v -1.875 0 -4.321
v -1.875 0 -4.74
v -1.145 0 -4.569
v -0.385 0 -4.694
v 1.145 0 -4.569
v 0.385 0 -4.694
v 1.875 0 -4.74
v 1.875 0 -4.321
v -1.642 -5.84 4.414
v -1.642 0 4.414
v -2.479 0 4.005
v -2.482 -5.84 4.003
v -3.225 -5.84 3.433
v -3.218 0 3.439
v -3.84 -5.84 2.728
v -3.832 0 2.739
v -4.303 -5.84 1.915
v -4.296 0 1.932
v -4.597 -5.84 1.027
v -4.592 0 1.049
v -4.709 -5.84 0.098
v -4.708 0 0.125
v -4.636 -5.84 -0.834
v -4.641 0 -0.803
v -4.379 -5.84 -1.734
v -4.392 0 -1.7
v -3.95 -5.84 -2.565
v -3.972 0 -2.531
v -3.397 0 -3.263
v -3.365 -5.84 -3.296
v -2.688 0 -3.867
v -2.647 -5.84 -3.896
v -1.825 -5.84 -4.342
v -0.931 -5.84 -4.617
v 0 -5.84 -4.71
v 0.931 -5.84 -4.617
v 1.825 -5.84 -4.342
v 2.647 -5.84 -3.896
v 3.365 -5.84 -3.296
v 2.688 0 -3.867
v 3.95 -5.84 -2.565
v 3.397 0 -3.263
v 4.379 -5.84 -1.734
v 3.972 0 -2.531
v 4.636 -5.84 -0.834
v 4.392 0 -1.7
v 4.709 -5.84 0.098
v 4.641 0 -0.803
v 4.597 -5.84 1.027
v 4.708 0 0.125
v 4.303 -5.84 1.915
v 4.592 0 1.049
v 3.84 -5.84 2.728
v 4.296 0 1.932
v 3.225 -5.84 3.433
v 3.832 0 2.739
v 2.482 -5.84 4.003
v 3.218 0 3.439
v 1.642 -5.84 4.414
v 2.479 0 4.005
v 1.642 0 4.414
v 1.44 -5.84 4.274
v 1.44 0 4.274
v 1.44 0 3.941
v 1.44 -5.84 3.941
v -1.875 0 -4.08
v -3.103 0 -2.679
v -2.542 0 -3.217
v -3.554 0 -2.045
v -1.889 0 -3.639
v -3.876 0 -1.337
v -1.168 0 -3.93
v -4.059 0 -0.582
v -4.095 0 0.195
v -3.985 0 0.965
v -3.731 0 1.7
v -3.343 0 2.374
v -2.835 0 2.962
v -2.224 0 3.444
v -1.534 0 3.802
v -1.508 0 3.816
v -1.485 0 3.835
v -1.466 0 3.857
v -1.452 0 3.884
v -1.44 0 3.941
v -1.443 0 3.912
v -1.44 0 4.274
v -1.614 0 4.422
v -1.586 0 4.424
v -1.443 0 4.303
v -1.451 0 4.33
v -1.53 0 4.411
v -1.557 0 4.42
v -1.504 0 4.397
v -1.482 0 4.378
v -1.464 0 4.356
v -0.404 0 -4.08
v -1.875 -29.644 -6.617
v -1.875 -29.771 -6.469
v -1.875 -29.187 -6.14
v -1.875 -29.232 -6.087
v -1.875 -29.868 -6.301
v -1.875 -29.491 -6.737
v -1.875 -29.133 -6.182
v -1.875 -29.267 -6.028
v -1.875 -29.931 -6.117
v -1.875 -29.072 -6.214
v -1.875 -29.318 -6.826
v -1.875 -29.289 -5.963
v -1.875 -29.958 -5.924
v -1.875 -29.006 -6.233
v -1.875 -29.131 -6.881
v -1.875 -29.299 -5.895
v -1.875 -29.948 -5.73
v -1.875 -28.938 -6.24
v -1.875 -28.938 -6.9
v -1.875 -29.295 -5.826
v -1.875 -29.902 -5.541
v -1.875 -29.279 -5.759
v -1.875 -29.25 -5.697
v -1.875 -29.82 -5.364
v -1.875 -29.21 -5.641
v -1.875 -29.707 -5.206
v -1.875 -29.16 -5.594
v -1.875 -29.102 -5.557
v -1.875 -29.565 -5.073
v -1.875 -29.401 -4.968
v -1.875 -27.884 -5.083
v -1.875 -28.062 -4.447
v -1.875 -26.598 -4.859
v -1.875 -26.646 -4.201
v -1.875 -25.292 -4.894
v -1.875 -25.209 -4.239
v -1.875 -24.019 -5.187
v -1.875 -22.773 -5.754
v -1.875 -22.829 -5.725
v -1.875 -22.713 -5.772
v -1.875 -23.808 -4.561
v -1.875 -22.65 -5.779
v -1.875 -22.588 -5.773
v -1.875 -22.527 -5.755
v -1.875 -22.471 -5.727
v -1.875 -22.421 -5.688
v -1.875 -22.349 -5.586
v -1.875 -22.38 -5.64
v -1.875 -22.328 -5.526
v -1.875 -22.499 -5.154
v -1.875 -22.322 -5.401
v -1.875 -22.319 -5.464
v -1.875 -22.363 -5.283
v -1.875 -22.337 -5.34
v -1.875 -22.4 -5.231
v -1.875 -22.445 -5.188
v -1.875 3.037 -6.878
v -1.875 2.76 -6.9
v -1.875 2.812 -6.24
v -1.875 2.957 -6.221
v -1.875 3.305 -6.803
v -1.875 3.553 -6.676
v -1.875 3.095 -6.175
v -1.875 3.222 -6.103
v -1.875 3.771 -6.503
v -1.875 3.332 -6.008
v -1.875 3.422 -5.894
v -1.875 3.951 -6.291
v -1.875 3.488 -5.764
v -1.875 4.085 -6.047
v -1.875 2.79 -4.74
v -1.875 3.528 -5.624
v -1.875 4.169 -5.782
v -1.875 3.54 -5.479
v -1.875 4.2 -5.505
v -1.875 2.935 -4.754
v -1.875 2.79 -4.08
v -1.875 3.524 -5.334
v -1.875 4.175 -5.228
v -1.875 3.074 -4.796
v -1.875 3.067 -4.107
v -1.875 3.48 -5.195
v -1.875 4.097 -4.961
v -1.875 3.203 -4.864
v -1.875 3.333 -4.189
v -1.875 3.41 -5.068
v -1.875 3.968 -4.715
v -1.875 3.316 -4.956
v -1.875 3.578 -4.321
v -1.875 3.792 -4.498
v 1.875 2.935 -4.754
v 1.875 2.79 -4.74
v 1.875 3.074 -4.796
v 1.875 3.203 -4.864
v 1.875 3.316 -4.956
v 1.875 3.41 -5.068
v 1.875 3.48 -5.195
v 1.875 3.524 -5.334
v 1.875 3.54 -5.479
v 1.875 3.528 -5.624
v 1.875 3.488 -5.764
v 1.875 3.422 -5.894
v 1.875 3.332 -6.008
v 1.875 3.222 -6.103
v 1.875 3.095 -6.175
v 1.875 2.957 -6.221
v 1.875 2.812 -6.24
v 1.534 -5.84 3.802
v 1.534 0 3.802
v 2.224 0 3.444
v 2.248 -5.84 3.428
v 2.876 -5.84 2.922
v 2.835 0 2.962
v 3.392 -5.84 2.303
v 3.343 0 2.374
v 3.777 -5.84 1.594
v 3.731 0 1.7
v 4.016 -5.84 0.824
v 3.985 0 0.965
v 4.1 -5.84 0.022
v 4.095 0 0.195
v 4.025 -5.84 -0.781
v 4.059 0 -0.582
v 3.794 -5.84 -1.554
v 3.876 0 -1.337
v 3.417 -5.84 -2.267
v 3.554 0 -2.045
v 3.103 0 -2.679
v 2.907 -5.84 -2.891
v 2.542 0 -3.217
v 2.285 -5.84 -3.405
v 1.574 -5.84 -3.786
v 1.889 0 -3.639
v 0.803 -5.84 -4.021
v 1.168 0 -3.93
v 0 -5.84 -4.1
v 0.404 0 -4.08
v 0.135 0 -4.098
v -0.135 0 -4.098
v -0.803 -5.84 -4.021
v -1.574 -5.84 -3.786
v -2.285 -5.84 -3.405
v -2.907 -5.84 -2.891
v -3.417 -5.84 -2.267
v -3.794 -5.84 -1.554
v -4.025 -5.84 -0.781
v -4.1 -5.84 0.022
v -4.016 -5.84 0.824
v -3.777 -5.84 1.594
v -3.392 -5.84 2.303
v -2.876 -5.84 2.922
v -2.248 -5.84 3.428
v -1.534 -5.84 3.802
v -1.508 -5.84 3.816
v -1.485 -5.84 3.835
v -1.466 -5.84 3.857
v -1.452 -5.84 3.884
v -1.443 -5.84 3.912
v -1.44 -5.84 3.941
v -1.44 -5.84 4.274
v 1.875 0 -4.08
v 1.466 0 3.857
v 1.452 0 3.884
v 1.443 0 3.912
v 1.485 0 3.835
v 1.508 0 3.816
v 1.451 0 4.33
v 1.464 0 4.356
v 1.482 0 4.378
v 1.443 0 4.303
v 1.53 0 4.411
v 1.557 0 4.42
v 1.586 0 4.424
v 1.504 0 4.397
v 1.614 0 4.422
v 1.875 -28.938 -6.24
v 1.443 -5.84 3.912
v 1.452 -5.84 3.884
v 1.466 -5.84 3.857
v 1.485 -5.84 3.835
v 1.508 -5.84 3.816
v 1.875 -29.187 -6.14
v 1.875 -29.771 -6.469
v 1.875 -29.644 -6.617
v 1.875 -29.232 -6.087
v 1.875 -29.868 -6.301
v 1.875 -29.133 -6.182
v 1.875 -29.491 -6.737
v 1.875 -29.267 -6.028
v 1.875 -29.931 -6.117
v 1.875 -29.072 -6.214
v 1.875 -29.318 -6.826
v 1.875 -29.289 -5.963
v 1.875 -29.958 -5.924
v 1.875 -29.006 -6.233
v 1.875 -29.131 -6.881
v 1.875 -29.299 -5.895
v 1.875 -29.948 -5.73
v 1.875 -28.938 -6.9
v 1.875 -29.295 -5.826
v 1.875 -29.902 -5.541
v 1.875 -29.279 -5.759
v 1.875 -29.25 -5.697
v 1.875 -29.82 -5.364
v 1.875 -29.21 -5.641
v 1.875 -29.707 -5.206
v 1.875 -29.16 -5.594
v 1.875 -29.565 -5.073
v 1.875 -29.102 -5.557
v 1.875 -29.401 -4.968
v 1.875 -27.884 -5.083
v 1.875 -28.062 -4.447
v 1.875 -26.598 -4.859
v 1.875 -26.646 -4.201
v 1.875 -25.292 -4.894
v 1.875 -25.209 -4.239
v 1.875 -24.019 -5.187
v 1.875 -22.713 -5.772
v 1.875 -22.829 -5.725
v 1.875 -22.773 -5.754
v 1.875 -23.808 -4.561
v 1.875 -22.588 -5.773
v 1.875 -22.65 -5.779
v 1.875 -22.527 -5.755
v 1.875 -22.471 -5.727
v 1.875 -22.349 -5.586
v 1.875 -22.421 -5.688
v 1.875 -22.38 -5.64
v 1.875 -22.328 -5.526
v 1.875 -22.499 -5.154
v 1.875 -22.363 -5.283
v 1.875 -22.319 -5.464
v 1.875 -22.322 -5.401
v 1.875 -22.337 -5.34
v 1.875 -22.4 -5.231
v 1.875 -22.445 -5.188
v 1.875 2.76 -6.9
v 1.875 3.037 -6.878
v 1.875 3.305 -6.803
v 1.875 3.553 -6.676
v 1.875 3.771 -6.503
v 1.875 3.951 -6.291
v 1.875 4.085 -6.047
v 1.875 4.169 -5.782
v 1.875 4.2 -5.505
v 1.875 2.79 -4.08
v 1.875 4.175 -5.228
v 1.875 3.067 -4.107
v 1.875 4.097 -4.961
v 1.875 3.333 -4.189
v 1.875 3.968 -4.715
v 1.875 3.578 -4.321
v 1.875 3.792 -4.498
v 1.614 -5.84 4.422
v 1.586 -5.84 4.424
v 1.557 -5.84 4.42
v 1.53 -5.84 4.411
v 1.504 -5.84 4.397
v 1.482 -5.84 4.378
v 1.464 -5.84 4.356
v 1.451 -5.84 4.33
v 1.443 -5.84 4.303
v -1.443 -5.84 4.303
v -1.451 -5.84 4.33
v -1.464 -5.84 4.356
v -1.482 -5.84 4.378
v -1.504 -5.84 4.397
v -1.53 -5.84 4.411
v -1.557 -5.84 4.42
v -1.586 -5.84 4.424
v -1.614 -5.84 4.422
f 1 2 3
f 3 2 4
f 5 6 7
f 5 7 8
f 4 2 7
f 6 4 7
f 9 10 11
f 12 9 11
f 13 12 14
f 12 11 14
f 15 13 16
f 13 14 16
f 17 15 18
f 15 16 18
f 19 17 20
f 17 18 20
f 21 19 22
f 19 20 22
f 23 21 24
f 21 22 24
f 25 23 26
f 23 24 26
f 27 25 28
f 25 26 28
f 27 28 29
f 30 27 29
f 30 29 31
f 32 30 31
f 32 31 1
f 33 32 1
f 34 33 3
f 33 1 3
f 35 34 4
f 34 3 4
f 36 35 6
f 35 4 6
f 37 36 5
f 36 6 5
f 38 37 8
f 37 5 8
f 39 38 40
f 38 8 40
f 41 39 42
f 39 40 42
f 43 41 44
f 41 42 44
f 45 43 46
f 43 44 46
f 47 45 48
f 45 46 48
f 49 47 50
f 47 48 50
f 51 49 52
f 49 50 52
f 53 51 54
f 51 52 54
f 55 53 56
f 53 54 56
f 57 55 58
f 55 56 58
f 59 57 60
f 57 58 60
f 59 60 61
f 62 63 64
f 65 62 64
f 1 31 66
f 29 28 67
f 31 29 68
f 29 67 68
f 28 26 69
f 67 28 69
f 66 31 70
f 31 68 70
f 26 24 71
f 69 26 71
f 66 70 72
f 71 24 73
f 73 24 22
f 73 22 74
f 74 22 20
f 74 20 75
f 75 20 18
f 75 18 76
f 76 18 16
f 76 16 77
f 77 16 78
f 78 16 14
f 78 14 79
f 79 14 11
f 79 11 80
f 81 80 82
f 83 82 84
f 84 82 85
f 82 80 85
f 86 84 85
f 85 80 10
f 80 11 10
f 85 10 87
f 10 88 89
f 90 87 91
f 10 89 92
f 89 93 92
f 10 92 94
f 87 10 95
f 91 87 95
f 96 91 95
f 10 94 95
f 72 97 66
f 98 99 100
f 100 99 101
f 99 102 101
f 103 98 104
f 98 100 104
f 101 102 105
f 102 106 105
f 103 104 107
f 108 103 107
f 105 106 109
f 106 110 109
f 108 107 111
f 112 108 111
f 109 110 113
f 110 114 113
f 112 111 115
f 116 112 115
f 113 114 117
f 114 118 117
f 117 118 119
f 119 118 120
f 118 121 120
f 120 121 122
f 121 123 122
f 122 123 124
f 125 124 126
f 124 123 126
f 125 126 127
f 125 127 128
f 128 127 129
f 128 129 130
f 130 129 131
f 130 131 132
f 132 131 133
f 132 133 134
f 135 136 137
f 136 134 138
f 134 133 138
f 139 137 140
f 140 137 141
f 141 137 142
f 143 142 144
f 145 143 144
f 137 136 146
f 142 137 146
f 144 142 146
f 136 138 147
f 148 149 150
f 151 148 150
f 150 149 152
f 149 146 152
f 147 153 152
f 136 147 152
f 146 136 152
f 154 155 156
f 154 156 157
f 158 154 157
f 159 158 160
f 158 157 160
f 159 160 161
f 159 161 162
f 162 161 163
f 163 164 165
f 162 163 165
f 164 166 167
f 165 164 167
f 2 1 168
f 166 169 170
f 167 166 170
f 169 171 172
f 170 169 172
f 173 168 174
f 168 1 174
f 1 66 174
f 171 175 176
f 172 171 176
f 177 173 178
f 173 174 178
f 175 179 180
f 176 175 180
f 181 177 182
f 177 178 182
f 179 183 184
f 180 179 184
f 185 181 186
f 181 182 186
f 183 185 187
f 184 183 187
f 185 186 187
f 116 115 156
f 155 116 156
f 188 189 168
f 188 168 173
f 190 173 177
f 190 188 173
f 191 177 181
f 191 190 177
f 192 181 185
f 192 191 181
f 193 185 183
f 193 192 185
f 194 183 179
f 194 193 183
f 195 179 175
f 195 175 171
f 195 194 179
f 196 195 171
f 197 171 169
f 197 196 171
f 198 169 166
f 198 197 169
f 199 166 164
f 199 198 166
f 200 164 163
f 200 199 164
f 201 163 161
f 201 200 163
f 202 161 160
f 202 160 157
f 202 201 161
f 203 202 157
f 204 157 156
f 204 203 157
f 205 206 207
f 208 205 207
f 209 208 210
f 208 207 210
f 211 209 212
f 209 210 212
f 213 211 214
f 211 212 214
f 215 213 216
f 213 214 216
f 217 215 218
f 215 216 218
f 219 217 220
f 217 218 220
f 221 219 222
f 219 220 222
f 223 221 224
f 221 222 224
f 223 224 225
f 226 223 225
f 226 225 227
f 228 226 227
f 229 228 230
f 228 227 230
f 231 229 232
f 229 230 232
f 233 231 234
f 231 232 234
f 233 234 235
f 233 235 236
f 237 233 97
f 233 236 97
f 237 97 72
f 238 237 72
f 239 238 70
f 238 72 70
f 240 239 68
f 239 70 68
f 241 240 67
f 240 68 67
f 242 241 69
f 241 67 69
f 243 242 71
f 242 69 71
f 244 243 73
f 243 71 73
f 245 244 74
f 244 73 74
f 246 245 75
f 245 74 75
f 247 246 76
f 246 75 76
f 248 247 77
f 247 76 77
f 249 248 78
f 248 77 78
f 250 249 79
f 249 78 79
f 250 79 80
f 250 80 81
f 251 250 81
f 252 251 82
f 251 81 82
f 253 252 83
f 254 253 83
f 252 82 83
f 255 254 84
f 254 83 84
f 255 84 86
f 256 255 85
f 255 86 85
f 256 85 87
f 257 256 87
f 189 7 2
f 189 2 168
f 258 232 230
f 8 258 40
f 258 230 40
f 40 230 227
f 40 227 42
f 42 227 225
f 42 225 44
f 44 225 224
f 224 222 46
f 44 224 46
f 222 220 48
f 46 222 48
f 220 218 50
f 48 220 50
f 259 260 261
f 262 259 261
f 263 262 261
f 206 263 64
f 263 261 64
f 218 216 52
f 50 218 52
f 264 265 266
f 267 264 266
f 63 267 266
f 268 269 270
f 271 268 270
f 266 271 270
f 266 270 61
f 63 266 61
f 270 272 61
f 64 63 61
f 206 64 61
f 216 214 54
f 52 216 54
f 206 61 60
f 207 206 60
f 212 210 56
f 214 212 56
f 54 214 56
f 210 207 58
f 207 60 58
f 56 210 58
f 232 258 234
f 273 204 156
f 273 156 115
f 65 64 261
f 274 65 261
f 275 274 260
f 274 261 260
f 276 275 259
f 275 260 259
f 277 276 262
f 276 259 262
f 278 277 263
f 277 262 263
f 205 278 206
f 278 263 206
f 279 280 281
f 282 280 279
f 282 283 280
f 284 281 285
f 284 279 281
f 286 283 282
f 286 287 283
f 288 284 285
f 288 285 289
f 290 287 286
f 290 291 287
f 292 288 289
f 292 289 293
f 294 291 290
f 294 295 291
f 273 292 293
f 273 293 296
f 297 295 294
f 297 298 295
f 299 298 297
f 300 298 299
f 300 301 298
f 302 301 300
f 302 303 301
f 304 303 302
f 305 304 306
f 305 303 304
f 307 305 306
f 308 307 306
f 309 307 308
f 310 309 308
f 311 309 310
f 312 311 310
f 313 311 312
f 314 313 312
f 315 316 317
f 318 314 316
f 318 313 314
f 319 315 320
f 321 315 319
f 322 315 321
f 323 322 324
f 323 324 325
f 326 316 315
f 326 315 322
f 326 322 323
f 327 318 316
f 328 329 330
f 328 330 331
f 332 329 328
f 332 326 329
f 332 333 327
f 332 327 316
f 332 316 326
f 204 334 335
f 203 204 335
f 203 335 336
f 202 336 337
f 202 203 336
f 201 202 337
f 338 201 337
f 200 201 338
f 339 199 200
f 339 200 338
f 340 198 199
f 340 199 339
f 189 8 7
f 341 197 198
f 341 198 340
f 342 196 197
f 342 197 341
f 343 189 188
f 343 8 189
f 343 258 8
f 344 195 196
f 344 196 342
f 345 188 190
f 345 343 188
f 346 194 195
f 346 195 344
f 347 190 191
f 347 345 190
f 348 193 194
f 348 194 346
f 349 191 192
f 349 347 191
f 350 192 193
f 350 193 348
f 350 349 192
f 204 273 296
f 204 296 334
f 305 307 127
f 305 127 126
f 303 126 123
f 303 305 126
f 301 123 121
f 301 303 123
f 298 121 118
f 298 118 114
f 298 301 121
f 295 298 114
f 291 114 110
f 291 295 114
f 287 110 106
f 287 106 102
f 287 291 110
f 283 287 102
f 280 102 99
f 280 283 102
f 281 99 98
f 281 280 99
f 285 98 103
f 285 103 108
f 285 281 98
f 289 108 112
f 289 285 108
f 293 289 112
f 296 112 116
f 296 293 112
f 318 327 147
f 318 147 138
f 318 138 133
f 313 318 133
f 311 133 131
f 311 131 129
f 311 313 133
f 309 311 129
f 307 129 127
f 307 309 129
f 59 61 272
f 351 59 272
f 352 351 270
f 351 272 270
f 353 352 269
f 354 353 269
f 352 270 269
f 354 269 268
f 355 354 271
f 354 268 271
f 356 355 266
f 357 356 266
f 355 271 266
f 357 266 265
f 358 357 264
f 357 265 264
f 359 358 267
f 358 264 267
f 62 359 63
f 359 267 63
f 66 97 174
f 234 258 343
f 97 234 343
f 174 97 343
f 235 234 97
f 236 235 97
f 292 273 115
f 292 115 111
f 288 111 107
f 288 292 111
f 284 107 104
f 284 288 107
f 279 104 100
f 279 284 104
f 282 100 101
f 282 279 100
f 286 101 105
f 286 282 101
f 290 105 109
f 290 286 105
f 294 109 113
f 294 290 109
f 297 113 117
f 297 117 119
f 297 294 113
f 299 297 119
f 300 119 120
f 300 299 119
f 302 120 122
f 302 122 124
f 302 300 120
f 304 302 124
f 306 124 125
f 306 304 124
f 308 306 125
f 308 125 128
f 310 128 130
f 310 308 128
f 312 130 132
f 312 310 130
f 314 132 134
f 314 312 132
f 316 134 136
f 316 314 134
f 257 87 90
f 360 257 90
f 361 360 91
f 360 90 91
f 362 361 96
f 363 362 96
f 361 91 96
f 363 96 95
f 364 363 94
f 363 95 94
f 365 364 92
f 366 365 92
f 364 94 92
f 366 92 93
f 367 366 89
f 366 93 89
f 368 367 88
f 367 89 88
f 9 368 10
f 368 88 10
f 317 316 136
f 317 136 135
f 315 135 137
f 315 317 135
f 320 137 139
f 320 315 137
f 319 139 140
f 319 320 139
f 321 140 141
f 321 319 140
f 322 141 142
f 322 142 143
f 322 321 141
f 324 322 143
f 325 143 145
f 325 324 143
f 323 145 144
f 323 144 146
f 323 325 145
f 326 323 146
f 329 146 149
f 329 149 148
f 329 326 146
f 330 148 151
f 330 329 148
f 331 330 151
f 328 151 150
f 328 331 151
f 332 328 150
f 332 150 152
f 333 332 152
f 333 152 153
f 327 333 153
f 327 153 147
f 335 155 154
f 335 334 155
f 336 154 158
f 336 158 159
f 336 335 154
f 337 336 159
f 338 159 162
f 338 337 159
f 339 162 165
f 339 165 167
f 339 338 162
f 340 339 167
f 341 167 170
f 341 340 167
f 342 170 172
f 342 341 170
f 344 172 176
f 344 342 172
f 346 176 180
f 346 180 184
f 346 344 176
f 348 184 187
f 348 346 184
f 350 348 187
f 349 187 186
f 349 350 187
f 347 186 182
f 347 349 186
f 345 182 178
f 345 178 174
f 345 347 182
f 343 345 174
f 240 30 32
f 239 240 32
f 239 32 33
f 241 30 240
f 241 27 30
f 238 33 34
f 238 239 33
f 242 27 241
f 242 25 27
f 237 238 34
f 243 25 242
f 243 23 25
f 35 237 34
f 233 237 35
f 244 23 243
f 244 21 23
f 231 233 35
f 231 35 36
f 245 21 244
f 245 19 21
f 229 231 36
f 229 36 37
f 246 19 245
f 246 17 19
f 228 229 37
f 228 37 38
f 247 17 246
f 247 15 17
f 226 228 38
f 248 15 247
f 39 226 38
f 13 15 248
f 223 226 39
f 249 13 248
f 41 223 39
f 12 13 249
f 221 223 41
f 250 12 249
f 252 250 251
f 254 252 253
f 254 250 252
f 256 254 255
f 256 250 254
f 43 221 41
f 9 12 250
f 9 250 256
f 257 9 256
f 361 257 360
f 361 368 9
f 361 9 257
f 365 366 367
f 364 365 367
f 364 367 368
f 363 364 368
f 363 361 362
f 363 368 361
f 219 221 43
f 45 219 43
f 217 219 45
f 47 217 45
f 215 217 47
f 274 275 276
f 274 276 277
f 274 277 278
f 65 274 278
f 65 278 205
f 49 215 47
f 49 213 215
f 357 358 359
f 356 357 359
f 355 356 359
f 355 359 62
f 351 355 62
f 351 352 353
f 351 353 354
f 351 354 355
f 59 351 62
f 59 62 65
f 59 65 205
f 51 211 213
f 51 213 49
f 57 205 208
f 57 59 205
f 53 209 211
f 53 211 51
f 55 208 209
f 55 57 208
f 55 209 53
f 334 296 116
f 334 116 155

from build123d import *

# Parameters (mm, degrees)
F1_DEPTH = 5.84
F2_W     = 2.79
F2_H     = 0.66
F3_DEPTH = 1.875


with BuildPart() as f1:
    # F0 (on Front) → F1 (new body)
    with BuildSketch(Plane.XZ):
        with BuildLine():
            ThreePointArc((1.5338823529, 3.8022631323), (0, -4.1), (-1.5338823529, 3.8022631323))
            ThreePointArc((-1.5338823529, 3.8022631323), (-1.4656664827, 3.8574586018), (-1.44, 3.9413703201))
            Line((-1.44, 3.9413703201), (-1.44, 4.2738156254))
            ThreePointArc((-1.44, 4.2738156254), (-1.5044003351, 4.3969931289), (-1.6423026316, 4.4144016657))
            ThreePointArc((-1.6423026316, 4.4144016657), (0, -4.71), (1.6423026316, 4.4144016657))
            ThreePointArc((1.6423026316, 4.4144016657), (1.5044003351, 4.3969931289), (1.44, 4.2738156254))
            Line((1.44, 4.2738156254), (1.44, 3.9413703201))
            ThreePointArc((1.44, 3.9413703201), (1.4656664827, 3.8574586018), (1.5338823529, 3.8022631323))
        make_face()
    extrude(amount=F1_DEPTH)

    # F2 (on Right) → F3 (join, symmetric)
    with BuildSketch(Plane.YZ):
        with Locations((1.395, -4.41)):
            Rectangle(F2_W, F2_H)
        with BuildLine():
            Line((2.79, -4.08), (2.79, -4.74))
            ThreePointArc((2.79, -4.74), (3.5399175523, -5.4788795349), (2.8122384852, -6.2396702274))
            ThreePointArc((2.8122384852, -6.2396702274), (2.79, -6.24), (2.7677615148, -6.2396702274))
            Line((2.7677615148, -6.2396702274), (-28.9377615148, -6.2396702274))
            ThreePointArc((-28.9377615148, -6.2396702274), (-29.2889547374, -5.9627547168), (-29.1015934199, -5.5566579103))
            ThreePointArc((-29.1015934199, -5.5566579103), (-25.9439060993, -4.8439864519), (-22.8290893137, -5.7253525592))
            ThreePointArc((-22.8290893137, -5.7253525592), (-22.363124468, -5.613733552), (-22.4985094857, -5.154110949))
            ThreePointArc((-22.4985094857, -5.154110949), (-25.9261622728, -4.1842250127), (-29.4009912886, -4.9684734867))
            ThreePointArc((-29.4009912886, -4.9684734867), (-29.9307497668, -6.1166999675), (-28.9377615148, -6.8996702274))
            Line((-28.9377615148, -6.8996702274), (2.7595065561, -6.8996702274))
            ThreePointArc((2.7595065561, -6.8996702274), (4.1999175544, -5.5052476135), (2.79, -4.08))
        make_face()
        with BuildLine():
            ThreePointArc((2.7677615148, -6.2396702274), (2.79, -6.24), (2.8122384852, -6.2396702274))
            Line((2.8122384852, -6.2396702274), (2.7677615148, -6.2396702274))
        make_face()
    extrude(amount=F3_DEPTH, both=True)


solid = f1.part
